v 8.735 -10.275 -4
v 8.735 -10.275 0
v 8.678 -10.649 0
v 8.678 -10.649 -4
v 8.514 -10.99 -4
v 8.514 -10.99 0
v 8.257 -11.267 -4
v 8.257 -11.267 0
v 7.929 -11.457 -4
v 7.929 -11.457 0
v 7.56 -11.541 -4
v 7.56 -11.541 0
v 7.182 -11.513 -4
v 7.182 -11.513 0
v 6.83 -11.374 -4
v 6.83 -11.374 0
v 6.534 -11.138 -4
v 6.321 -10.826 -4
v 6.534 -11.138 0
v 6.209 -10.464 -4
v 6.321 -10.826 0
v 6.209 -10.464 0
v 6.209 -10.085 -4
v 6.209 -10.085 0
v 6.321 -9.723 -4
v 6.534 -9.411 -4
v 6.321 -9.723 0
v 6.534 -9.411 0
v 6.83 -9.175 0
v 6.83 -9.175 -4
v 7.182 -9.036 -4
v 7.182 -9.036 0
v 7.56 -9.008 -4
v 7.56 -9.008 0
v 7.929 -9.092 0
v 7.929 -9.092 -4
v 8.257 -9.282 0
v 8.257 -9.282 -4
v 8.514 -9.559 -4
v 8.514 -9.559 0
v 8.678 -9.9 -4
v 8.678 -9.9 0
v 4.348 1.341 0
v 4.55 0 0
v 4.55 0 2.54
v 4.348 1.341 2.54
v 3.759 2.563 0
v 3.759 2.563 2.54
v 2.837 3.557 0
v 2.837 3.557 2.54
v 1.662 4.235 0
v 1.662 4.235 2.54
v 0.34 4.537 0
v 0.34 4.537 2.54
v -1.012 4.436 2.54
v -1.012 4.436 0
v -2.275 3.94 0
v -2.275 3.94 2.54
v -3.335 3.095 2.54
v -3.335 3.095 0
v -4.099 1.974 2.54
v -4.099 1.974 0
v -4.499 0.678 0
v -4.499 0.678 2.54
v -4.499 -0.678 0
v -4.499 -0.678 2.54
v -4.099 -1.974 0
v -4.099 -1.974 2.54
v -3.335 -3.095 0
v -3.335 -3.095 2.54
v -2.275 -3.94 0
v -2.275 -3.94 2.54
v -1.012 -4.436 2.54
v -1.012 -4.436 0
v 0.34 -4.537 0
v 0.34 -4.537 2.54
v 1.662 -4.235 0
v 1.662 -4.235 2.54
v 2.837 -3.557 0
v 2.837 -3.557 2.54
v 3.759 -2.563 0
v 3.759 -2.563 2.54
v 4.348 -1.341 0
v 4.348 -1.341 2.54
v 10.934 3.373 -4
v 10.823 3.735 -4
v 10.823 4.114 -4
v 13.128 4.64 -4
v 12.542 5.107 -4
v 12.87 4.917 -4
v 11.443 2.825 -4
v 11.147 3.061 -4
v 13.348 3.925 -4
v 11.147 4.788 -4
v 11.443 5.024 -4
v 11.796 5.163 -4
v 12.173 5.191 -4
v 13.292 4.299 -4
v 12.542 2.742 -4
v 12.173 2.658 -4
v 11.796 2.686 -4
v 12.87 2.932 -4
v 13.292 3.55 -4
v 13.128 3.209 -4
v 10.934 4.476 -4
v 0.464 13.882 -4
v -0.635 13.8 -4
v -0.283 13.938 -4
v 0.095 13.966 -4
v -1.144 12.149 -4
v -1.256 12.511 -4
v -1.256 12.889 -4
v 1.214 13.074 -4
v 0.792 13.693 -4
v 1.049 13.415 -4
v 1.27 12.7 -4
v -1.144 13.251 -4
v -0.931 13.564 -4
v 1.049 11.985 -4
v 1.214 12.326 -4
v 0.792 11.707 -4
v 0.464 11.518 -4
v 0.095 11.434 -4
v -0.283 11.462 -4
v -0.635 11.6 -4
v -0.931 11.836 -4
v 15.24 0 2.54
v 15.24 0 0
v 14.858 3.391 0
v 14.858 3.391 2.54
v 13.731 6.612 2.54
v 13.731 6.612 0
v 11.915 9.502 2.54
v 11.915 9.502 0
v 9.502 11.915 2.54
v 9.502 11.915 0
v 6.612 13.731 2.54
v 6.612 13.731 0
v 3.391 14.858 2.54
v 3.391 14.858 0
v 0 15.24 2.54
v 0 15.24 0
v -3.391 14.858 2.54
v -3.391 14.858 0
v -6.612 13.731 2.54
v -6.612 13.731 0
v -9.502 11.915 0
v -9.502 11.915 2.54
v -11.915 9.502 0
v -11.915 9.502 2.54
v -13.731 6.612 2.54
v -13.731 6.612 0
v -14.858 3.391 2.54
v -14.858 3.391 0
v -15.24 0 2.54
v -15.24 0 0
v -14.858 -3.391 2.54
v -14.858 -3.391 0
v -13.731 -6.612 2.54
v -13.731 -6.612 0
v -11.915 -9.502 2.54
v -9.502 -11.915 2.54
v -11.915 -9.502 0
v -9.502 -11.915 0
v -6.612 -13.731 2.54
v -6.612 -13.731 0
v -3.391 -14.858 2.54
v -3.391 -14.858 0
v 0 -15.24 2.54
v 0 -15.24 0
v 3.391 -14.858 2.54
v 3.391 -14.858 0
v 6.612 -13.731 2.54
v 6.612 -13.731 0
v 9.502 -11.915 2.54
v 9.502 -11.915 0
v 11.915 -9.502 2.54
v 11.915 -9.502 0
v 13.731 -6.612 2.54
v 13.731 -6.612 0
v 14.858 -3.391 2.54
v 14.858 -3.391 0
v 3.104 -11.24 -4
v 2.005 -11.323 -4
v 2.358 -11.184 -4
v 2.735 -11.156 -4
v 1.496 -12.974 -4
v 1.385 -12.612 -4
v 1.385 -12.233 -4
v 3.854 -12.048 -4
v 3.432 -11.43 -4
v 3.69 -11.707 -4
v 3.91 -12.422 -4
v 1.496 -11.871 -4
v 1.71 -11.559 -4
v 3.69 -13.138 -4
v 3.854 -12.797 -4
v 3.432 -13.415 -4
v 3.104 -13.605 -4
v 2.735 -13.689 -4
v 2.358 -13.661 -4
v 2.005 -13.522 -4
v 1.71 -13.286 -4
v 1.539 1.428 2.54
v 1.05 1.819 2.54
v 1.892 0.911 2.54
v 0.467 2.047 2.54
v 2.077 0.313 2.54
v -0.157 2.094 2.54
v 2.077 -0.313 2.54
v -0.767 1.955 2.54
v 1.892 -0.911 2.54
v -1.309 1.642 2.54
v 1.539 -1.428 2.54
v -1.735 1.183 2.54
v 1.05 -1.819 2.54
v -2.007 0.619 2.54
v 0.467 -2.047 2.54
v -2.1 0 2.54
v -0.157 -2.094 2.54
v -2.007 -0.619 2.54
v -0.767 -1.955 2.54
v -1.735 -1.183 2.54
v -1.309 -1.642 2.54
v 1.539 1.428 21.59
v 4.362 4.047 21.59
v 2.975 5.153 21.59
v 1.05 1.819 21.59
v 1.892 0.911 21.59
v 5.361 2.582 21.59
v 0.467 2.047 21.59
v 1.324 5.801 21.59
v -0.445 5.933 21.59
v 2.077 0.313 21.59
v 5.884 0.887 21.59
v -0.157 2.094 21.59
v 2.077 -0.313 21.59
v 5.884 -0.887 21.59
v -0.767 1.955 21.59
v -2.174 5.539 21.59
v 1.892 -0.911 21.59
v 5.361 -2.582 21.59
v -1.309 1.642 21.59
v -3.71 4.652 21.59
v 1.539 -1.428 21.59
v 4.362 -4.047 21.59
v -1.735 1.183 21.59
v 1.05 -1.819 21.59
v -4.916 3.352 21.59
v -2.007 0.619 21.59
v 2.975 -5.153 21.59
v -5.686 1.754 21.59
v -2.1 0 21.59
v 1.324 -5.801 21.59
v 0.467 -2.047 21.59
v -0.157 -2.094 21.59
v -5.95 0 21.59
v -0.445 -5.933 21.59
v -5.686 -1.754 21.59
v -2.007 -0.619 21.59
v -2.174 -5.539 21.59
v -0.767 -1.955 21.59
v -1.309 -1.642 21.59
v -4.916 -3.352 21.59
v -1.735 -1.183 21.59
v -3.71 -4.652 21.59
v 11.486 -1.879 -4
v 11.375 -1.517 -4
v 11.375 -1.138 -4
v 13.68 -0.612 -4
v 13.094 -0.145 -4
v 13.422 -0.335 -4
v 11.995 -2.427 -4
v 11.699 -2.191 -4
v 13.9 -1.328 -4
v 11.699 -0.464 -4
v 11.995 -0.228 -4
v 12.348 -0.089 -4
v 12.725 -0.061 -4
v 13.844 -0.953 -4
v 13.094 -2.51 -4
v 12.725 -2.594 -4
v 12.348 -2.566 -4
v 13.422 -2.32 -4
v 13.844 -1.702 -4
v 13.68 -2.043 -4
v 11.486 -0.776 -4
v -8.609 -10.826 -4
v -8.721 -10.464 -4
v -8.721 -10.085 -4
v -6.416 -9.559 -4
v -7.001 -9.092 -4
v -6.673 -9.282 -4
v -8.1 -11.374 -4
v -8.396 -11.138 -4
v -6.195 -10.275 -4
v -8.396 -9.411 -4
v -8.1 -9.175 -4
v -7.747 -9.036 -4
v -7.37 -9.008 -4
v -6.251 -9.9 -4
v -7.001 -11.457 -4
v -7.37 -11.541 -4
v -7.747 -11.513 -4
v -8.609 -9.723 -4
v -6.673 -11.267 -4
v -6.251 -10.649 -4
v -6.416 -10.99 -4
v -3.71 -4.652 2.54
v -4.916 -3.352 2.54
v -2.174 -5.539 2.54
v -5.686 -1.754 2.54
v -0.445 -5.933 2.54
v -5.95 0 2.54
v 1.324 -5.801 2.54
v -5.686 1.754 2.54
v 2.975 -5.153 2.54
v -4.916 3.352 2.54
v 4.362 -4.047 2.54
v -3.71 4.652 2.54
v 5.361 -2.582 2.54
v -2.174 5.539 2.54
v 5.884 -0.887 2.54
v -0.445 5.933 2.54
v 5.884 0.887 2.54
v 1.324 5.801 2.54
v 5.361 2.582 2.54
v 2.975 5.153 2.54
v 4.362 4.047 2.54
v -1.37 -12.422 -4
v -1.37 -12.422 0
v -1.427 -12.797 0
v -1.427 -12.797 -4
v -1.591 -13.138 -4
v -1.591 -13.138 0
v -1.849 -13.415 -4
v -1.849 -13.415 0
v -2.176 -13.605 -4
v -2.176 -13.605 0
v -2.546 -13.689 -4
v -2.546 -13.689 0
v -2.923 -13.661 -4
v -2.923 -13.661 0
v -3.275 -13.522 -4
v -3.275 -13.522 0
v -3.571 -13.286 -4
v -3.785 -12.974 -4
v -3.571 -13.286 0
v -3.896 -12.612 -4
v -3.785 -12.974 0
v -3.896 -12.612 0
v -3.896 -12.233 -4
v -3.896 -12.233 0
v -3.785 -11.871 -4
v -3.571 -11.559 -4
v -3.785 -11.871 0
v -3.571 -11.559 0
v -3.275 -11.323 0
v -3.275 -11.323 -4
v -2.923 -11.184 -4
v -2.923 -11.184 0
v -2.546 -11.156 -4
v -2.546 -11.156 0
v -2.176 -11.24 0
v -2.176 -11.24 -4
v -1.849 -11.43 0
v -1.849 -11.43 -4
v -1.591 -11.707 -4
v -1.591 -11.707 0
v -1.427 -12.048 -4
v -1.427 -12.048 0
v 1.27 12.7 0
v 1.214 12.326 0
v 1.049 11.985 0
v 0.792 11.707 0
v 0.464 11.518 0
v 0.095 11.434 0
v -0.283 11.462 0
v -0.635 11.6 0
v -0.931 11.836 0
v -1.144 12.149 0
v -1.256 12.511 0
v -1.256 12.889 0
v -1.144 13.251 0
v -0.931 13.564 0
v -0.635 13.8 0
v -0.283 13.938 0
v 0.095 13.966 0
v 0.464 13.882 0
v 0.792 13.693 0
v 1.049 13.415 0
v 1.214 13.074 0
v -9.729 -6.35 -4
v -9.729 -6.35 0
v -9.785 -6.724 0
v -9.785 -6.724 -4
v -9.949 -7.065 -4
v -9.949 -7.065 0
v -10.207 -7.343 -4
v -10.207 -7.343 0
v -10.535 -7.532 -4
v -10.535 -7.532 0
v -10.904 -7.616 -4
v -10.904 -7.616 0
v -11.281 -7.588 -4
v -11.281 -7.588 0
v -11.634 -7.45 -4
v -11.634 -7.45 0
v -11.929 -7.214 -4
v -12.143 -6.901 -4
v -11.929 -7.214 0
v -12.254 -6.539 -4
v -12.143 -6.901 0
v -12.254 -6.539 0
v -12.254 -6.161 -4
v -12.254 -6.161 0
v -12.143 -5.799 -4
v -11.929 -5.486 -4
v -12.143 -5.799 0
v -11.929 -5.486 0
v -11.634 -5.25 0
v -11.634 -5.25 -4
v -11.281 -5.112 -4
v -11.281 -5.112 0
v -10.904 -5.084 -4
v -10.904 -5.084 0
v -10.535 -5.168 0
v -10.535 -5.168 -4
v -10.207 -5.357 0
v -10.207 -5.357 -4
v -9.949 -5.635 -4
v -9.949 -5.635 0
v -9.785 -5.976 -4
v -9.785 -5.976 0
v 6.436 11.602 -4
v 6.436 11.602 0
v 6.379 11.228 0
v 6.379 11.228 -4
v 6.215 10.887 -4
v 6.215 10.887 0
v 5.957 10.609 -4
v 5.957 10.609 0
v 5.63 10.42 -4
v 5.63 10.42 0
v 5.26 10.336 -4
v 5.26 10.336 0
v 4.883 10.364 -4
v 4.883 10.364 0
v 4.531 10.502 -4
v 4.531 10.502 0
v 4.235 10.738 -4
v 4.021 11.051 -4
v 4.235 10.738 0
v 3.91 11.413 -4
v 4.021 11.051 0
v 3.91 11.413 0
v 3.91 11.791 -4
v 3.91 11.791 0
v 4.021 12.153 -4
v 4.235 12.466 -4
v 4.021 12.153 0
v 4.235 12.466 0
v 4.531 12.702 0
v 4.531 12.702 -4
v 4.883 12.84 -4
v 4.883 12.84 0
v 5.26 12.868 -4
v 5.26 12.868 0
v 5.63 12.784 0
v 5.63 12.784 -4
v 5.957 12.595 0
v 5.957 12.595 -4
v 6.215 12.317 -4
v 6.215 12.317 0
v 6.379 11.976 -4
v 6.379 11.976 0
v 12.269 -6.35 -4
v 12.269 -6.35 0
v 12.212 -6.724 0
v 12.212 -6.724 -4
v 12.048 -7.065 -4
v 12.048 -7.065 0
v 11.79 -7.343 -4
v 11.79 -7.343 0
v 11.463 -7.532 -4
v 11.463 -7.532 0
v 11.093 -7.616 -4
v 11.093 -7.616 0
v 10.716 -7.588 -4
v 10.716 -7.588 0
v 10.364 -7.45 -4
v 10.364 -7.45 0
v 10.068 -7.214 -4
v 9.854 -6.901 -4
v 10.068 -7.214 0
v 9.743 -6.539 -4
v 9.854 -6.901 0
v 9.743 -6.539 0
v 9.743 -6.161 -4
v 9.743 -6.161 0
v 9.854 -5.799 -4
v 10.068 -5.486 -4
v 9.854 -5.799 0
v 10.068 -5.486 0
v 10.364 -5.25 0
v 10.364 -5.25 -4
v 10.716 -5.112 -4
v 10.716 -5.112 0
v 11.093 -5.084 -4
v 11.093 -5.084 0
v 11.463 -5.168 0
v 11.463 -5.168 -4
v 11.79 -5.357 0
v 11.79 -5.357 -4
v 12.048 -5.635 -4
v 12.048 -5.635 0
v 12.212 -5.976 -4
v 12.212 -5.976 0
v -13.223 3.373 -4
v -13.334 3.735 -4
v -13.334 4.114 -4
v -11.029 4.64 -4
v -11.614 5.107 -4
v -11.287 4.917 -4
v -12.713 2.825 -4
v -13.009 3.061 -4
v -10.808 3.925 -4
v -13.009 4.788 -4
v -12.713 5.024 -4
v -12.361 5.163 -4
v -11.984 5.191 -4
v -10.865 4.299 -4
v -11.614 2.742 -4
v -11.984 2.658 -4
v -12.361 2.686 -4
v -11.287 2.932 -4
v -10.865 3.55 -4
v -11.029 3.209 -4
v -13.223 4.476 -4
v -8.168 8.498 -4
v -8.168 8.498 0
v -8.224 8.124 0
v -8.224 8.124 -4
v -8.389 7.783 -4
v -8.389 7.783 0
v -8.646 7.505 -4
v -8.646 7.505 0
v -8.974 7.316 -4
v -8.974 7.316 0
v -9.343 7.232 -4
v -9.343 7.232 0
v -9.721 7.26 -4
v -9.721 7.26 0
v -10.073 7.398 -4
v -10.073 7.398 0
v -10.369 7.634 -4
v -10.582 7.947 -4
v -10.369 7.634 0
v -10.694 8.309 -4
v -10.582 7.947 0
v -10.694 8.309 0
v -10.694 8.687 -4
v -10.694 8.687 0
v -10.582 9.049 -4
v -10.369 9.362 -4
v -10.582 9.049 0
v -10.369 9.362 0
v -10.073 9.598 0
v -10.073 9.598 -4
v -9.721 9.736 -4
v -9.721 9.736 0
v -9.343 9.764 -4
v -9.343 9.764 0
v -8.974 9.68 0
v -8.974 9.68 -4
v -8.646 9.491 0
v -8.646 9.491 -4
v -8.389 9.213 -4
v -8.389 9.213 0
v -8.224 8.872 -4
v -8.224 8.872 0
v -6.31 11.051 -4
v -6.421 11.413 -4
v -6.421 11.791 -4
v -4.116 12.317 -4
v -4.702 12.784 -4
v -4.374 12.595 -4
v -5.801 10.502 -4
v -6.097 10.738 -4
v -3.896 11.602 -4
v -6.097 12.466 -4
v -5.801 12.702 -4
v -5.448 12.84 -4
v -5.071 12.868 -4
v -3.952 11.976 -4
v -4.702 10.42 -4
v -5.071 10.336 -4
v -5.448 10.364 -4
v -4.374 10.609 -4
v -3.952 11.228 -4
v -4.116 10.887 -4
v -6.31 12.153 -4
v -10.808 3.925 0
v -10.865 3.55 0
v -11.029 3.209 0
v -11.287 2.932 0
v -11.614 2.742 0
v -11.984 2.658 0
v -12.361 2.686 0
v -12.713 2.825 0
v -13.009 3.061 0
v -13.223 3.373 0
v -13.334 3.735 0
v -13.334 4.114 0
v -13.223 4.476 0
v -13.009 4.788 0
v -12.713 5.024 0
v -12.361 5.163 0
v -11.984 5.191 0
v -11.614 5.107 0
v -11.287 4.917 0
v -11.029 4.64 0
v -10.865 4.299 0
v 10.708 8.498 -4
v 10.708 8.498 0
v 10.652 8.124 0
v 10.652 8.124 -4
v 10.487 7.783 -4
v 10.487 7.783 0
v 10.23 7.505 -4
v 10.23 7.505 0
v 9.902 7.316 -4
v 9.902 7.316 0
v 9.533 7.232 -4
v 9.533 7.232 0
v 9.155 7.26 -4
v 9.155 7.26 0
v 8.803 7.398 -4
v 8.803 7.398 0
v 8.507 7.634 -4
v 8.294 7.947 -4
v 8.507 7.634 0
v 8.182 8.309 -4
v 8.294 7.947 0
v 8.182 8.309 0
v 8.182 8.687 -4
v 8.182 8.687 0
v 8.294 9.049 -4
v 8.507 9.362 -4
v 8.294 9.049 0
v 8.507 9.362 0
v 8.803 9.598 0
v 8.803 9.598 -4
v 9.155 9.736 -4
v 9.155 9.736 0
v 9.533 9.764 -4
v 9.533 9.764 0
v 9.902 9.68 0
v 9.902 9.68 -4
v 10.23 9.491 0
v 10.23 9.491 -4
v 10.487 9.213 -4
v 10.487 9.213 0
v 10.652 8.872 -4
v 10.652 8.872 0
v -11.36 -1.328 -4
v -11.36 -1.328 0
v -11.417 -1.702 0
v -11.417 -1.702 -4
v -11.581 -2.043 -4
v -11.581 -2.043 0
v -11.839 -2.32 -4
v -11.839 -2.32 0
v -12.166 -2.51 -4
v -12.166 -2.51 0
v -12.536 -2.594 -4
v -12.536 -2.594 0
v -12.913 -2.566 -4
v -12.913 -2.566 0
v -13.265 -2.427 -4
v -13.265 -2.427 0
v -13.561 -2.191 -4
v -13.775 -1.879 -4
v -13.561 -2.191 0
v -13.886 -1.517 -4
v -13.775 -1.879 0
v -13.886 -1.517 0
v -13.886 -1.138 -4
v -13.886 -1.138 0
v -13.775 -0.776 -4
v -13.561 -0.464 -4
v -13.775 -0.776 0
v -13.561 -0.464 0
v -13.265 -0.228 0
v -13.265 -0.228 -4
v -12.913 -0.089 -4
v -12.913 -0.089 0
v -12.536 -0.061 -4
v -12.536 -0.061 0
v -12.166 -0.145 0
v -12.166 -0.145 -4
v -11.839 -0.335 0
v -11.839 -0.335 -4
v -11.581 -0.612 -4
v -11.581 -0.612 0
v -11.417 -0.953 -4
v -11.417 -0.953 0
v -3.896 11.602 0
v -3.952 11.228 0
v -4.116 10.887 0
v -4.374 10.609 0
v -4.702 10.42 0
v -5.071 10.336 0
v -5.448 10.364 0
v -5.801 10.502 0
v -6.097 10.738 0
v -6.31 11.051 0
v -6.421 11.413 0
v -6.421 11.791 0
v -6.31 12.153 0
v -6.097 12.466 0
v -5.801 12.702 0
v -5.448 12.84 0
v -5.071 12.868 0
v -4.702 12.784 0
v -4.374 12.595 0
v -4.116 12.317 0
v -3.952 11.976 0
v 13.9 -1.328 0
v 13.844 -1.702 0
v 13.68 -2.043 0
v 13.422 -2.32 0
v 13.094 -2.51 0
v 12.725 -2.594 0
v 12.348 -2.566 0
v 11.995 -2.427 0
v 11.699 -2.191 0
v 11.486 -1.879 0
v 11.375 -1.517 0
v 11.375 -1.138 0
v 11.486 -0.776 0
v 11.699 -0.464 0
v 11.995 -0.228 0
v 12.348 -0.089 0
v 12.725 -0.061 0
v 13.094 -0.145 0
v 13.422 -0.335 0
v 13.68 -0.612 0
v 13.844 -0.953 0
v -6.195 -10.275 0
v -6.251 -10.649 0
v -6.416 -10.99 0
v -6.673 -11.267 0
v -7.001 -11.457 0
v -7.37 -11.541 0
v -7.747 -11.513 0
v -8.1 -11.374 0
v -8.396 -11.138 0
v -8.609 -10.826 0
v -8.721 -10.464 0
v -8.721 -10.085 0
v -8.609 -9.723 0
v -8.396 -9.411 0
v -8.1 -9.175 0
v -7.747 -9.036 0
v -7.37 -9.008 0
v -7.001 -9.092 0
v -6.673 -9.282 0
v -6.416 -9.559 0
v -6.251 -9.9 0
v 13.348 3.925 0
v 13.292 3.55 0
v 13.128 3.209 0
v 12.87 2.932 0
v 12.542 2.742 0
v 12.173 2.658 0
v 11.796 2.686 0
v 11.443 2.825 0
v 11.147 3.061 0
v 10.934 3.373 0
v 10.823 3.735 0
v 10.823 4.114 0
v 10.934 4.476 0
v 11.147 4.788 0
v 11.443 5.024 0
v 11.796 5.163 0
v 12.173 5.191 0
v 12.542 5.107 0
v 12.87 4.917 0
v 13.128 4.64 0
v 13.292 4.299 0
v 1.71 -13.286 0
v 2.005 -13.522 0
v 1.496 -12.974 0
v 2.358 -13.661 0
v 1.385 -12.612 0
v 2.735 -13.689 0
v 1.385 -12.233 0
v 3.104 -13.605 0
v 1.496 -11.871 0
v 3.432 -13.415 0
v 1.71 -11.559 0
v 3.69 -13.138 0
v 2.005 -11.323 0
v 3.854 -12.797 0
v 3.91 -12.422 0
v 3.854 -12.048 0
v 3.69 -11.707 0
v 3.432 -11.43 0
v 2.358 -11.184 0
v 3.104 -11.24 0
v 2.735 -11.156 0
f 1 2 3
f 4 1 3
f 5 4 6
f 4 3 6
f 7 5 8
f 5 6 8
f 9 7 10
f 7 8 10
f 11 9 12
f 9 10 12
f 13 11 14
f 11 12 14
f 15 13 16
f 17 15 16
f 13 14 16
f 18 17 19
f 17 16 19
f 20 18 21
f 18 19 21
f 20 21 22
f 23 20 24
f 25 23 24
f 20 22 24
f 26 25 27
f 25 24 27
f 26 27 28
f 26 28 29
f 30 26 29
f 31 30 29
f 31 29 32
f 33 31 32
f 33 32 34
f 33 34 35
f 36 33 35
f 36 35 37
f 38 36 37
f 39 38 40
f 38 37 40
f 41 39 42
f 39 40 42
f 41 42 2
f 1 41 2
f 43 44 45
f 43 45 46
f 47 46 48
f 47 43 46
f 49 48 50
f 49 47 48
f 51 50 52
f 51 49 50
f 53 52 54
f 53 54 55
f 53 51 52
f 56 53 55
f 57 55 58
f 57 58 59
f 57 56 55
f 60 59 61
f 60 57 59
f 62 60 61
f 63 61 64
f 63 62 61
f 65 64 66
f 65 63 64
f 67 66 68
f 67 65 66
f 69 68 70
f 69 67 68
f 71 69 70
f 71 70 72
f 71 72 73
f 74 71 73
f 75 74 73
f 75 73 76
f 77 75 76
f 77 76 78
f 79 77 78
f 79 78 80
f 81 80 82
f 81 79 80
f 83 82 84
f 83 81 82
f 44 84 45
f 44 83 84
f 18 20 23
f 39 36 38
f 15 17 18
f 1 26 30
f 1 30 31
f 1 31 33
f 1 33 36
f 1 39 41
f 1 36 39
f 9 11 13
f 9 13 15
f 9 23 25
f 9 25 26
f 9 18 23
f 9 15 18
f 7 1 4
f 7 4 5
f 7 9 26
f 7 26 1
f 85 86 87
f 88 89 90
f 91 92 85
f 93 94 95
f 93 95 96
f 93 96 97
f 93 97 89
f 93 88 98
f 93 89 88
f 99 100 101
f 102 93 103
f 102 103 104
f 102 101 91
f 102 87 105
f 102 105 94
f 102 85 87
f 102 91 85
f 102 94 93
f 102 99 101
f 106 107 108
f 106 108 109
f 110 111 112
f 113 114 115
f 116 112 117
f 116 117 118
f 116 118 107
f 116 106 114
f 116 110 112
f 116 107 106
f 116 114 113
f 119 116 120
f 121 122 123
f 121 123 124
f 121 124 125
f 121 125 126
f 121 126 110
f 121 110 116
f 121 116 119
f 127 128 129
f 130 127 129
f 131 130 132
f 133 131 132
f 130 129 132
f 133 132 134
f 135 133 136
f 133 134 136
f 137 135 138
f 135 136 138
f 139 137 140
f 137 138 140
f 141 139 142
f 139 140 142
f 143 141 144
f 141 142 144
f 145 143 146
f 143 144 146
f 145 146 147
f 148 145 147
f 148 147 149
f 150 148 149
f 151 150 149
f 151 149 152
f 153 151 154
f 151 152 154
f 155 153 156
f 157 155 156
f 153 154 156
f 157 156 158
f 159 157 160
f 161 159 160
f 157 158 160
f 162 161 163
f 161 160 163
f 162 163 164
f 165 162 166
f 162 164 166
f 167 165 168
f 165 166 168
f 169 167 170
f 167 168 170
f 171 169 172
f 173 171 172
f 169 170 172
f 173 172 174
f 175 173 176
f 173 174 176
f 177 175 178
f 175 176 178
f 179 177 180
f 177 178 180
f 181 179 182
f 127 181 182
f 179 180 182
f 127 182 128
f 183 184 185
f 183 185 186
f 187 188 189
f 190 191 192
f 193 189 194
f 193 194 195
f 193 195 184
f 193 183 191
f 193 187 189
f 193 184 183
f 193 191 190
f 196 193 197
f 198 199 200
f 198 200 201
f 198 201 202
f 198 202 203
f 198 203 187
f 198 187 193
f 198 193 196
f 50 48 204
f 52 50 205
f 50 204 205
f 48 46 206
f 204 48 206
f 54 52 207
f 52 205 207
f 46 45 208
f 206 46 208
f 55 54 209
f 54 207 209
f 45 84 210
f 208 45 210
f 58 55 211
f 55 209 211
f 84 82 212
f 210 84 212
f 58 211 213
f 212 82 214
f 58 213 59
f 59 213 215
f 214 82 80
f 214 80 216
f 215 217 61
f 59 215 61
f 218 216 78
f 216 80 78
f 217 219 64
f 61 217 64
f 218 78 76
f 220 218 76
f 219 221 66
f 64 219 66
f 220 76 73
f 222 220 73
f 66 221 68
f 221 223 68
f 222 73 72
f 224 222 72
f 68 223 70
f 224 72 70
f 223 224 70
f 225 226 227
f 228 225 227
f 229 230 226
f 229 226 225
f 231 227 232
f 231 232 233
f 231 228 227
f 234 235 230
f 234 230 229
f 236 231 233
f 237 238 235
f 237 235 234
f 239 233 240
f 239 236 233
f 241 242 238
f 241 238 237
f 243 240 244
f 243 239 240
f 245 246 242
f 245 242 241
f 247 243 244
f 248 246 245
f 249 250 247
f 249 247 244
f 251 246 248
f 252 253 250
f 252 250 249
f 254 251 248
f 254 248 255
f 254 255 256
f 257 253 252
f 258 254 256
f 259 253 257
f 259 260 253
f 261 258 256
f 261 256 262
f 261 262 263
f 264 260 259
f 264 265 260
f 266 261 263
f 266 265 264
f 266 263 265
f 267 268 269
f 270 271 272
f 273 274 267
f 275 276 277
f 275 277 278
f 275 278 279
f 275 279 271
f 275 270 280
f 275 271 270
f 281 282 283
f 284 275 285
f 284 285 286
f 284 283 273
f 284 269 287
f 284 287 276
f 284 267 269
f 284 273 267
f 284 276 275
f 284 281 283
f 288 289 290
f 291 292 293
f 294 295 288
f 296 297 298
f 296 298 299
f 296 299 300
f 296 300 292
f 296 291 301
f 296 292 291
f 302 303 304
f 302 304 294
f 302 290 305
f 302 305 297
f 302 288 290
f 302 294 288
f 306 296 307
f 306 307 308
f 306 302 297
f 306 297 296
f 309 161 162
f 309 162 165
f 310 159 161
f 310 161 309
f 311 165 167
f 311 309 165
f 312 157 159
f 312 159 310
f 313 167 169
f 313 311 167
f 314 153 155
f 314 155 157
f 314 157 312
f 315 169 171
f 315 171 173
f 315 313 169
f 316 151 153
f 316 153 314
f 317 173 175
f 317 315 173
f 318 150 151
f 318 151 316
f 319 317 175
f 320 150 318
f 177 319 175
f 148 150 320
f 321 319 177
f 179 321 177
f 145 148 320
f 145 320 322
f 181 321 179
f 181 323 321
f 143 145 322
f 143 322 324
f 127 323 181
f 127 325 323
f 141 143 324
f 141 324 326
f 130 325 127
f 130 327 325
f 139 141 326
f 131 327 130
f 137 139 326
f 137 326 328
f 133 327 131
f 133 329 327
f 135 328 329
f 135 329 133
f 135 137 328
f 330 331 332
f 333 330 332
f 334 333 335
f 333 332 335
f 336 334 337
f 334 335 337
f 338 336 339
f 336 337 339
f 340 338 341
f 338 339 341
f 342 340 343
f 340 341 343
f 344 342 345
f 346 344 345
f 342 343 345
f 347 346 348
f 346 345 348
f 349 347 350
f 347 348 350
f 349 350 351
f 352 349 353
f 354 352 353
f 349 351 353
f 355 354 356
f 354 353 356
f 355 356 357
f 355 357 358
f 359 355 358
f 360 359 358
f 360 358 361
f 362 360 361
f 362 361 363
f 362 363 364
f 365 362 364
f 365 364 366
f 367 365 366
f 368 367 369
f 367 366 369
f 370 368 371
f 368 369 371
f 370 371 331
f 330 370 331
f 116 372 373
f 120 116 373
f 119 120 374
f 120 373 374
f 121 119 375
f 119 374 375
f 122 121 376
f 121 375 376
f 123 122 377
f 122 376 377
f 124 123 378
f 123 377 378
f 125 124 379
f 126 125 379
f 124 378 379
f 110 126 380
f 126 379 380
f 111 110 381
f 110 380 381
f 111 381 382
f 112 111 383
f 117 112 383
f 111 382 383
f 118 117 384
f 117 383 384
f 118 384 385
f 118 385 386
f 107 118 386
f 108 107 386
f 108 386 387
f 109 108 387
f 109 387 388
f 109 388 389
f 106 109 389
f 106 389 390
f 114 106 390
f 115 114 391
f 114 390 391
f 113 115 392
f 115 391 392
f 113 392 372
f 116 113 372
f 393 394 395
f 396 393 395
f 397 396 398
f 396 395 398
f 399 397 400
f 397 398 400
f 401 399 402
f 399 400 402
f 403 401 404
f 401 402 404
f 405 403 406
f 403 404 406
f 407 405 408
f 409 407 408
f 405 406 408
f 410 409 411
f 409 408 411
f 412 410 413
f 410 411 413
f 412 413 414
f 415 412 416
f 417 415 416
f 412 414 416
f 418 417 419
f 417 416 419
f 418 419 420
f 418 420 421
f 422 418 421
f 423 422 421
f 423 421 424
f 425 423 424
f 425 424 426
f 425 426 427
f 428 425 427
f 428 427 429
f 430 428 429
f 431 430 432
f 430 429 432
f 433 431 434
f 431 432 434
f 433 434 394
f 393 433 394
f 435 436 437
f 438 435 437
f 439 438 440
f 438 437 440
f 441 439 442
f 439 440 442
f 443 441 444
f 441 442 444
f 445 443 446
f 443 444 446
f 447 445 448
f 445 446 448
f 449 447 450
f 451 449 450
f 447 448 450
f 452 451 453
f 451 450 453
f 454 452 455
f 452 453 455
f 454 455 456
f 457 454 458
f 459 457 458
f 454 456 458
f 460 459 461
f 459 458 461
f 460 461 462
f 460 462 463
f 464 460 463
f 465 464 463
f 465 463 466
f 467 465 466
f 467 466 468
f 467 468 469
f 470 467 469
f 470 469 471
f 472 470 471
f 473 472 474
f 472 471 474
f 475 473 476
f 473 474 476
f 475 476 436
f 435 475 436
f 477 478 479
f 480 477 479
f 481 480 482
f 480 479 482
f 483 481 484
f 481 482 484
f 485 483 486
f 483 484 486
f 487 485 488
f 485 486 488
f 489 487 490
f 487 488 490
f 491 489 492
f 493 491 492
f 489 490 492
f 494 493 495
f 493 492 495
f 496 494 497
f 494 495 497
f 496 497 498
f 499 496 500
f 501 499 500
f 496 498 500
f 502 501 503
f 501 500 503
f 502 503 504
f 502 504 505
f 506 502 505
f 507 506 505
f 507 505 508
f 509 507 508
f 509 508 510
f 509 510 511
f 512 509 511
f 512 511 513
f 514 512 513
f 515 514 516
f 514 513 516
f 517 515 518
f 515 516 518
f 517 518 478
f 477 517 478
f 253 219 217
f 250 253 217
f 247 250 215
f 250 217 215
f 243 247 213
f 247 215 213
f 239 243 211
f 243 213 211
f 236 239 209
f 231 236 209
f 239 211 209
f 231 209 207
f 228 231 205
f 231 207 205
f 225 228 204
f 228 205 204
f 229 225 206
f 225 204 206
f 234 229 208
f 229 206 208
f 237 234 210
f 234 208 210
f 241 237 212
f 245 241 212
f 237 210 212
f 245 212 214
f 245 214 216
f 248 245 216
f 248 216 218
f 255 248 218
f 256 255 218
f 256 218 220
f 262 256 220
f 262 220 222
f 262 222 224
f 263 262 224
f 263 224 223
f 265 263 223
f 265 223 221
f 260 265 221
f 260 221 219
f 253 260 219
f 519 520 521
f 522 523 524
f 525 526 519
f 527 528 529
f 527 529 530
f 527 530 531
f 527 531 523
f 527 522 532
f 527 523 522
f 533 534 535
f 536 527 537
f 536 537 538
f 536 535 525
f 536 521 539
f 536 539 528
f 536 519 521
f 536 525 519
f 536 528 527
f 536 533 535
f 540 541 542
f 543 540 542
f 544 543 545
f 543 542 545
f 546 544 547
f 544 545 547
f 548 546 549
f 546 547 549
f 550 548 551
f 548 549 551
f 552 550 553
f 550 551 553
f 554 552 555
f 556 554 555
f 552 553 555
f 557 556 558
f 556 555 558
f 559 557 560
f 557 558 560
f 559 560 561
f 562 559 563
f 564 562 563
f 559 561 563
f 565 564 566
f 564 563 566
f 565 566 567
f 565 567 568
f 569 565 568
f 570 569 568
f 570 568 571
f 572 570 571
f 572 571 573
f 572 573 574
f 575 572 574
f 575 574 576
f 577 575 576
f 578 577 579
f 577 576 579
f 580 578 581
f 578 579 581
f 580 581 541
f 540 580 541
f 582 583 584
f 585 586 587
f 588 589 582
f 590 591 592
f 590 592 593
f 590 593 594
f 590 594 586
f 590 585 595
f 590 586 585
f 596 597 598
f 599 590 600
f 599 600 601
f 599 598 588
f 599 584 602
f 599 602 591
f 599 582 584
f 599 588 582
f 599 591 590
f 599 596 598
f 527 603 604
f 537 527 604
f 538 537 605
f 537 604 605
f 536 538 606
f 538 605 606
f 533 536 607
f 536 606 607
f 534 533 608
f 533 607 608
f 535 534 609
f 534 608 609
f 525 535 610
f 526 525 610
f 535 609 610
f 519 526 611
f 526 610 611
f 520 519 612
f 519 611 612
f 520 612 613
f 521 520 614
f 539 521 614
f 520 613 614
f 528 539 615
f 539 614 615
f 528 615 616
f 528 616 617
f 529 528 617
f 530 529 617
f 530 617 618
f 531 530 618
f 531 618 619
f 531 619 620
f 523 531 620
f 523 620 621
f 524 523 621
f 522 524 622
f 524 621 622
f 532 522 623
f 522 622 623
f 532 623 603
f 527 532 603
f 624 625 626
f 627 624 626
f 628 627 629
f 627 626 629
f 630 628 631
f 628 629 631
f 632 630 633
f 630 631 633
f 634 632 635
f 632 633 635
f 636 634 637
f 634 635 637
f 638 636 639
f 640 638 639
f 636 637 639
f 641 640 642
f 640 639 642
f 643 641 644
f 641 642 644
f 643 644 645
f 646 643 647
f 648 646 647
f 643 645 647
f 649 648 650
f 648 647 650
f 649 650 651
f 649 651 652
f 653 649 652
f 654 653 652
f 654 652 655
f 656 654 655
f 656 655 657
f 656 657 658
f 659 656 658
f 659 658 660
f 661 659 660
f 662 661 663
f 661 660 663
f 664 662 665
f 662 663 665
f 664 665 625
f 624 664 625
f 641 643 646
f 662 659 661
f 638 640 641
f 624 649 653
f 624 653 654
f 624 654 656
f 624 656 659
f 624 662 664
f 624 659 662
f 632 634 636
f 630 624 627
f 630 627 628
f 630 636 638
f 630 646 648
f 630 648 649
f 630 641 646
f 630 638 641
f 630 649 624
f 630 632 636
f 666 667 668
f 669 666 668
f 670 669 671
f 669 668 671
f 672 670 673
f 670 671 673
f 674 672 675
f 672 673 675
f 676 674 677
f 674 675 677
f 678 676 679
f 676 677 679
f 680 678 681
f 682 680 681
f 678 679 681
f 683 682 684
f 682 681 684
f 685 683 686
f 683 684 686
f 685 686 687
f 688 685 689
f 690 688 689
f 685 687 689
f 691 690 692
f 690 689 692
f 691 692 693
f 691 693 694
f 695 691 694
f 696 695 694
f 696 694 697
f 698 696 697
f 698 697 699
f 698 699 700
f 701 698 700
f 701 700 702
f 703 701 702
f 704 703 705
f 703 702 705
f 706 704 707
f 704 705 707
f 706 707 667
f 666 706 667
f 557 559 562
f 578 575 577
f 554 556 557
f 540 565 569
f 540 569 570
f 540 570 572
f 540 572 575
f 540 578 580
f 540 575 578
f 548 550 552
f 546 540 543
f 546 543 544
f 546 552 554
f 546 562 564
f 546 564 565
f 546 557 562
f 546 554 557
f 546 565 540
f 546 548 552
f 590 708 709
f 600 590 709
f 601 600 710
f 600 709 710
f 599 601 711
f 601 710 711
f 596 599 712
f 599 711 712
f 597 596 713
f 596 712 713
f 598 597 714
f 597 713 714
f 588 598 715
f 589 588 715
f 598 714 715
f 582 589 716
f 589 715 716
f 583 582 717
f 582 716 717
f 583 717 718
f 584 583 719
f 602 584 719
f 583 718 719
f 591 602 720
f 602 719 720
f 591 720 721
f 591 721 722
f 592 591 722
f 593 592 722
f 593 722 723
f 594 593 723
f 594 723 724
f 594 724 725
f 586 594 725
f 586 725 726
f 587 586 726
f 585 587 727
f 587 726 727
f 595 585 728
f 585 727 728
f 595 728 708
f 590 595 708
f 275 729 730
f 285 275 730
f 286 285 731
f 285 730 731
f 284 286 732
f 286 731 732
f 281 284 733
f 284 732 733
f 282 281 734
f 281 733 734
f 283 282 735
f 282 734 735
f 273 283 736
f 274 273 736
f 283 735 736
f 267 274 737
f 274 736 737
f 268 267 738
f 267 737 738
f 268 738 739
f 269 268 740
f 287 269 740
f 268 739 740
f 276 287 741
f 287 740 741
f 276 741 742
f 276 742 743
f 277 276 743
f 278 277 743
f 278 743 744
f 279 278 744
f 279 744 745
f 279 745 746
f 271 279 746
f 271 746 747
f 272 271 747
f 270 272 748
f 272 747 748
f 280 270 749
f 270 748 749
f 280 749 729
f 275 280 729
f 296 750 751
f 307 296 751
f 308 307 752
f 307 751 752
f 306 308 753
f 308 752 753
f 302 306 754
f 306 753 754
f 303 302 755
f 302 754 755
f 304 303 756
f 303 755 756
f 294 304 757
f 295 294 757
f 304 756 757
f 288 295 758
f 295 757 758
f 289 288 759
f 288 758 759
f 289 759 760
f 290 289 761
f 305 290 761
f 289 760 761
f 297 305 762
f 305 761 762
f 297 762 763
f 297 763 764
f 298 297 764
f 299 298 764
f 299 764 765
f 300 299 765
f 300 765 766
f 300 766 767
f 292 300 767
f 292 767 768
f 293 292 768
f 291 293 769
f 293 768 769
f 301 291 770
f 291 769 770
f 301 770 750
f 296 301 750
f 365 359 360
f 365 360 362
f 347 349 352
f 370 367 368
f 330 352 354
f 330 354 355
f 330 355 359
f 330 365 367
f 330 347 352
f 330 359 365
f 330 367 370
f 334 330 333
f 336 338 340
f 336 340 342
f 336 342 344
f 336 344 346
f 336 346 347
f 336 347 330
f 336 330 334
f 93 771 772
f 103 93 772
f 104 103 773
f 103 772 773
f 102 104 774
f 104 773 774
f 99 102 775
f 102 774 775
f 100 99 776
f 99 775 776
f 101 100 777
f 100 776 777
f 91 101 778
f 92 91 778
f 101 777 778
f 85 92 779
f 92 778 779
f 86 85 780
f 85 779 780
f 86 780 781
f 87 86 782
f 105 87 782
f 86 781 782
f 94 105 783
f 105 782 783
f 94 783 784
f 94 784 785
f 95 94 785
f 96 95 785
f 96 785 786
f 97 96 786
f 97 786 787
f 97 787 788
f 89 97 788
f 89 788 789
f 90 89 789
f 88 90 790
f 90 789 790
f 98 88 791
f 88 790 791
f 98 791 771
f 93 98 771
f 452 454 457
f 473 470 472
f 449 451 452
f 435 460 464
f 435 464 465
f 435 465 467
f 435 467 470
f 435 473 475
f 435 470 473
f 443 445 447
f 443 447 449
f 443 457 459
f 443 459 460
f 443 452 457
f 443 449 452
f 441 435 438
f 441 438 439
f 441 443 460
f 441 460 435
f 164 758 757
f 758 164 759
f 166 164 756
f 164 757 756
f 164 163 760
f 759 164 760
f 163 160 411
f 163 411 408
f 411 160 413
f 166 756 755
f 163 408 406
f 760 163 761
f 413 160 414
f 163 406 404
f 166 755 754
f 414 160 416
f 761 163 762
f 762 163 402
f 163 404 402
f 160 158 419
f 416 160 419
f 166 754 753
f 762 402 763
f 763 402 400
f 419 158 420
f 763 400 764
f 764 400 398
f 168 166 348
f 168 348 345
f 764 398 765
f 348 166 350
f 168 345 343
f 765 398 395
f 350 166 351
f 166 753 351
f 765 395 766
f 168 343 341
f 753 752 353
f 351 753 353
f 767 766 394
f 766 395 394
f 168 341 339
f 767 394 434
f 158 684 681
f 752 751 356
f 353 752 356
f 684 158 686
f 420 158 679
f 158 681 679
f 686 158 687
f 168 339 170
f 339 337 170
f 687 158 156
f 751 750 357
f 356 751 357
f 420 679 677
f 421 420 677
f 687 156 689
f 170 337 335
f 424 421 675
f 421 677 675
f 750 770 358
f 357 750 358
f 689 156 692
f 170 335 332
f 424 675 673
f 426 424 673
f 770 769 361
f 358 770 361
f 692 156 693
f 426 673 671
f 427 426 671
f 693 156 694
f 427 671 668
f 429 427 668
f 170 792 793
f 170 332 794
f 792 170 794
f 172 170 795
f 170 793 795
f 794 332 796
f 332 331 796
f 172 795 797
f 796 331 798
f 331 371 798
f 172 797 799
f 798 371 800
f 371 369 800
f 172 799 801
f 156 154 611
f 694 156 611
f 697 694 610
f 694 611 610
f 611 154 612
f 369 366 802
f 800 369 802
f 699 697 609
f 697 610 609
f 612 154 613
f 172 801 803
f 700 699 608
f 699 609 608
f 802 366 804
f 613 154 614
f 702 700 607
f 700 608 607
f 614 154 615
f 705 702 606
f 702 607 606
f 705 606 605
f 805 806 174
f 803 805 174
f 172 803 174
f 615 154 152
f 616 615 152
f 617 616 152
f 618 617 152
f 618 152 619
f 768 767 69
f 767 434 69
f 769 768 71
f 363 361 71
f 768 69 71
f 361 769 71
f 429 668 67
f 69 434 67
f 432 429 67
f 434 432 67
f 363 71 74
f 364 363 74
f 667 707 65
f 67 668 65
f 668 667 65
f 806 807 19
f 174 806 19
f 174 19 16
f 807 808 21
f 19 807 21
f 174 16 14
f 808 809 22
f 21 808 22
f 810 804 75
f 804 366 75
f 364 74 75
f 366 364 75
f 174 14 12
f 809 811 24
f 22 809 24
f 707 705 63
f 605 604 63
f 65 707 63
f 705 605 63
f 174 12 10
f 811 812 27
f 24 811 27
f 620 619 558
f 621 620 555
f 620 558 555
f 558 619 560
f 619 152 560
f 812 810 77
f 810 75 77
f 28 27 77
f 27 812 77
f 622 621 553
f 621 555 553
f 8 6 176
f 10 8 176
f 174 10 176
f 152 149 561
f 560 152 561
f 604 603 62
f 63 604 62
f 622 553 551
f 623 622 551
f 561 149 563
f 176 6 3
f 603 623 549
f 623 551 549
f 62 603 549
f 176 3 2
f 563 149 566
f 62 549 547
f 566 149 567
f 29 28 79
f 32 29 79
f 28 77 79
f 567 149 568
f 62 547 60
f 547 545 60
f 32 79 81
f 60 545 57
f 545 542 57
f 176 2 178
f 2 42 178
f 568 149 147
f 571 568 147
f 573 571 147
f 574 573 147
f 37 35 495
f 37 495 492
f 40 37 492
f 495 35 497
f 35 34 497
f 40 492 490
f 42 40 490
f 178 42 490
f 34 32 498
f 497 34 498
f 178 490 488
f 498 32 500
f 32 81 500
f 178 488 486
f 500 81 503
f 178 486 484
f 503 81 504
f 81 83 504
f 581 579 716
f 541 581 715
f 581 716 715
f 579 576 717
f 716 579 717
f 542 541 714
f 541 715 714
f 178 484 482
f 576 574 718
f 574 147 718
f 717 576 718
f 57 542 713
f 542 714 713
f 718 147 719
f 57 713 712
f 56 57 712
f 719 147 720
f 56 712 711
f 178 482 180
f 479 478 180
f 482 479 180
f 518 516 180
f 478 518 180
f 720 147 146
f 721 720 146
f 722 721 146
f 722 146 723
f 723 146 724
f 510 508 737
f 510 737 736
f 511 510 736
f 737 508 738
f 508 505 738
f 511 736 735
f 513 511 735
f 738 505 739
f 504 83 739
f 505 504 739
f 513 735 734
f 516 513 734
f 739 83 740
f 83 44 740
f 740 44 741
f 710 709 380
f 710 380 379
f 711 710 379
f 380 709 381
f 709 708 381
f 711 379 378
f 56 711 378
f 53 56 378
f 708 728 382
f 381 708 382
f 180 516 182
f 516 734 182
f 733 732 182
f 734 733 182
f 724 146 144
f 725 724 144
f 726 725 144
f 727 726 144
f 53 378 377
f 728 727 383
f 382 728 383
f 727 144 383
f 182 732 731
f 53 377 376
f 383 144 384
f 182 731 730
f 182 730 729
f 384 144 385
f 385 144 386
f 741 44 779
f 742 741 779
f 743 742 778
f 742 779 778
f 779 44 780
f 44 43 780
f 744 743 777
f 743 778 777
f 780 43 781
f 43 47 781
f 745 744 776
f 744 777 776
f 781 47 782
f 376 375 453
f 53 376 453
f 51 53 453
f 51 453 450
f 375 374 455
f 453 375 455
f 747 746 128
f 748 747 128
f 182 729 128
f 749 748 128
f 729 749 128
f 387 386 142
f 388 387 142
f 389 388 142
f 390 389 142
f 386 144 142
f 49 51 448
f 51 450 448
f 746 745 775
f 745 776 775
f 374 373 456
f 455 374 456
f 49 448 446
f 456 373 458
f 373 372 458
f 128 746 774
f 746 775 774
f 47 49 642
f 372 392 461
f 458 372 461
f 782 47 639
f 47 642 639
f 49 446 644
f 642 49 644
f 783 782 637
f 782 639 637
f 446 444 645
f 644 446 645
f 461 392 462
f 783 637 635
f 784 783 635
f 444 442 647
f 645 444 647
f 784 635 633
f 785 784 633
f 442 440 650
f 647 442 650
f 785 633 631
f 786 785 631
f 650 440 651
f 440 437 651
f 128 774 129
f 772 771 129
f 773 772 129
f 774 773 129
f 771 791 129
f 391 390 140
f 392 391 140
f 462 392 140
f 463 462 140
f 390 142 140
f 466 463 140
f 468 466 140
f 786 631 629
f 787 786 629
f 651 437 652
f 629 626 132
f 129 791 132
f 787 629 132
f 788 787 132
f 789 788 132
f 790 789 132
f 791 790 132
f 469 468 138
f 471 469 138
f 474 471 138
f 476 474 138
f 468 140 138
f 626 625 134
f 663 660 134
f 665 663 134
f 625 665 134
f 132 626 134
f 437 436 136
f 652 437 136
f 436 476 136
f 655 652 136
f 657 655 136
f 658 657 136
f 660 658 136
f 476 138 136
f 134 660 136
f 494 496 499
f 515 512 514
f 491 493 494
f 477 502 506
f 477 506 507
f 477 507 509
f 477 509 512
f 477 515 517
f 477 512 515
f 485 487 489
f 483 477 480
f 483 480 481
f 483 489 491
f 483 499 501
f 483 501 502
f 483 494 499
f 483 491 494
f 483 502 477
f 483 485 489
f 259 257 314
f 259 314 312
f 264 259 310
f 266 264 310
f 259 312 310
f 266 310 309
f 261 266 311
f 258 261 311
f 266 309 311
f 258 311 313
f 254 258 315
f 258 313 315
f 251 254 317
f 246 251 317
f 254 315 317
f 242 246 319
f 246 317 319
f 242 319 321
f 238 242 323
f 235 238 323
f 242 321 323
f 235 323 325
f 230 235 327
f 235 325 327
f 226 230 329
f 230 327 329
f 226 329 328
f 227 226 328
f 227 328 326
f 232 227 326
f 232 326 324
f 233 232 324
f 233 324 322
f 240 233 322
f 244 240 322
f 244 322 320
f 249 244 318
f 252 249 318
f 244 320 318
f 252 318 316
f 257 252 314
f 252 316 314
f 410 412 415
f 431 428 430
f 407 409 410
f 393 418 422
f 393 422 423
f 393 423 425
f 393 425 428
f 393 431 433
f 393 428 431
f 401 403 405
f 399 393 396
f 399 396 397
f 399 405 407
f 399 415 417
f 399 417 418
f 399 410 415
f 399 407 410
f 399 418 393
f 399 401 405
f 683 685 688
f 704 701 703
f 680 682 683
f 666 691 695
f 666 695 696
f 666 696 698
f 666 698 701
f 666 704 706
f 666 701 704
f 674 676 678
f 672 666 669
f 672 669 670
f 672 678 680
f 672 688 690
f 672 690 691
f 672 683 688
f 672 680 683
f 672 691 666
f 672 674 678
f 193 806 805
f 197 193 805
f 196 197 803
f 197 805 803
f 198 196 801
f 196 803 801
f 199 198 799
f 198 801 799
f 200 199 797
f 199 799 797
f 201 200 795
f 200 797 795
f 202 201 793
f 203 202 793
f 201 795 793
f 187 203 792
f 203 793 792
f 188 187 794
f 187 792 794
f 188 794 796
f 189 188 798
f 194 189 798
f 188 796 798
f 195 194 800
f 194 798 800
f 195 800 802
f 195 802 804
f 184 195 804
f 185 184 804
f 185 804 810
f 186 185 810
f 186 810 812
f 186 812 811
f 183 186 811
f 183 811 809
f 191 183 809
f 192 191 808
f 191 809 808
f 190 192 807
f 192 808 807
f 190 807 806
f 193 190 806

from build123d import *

# Parameters (mm, degrees)
SKETCH1_R             = 15.24
SKETCH1_R_2           = 4.55
BOSS_EXTRUDE1_DEPTH   = 2.54
SKETCH2_R             = 5.95
BOSS_EXTRUDE2_DEPTH   = 19.05
SKETCH5_R             = 1.27
BOSS_EXTRUDE5_DEPTH   = 4.000000128
M5X0_8_TAPPED_HOLE2_D = 4.2


with BuildPart() as part:
    # Sketch1 → Boss-Extrude1 (new body)
    with BuildSketch(Plane.XY):
        Circle(SKETCH1_R)
        Circle(SKETCH1_R_2, mode=Mode.SUBTRACT)
    extrude(amount=BOSS_EXTRUDE1_DEPTH)

    # Sketch2 → Boss-Extrude2 (add)
    with BuildSketch(Plane.XY.offset(2.54)):
        with Locations(Location((0, 0, 0), (0, 0, 180))):
            Circle(SKETCH2_R)
    extrude(amount=BOSS_EXTRUDE2_DEPTH)

    # Sketch5 → Boss-Extrude5 (add)
    with BuildSketch(Plane(origin=(0, 0, 0), x_dir=(-1, 0, 0), z_dir=(0, 0, -1))):
        with Locations(Location((0, 12.7, 0), (0, 0, 180))):
            Circle(SKETCH5_R)
        with Locations(Location((5.165555367, 11.602027312, 0), (0, 0, 180))):
            Circle(SKETCH5_R)
        with Locations(Location((9.437939284, 8.497958701, 0), (0, 0, 180))):
            Circle(SKETCH5_R)
        with Locations(Location((12.078417757, 3.924515829, 0), (0, 0, 180))):
            Circle(SKETCH5_R)
        with Locations(Location((12.630428071, -1.327511483, 0), (0, 0, 180))):
            Circle(SKETCH5_R)
        with Locations(Location((10.998522628, -6.35, 0), (0, 0, 180))):
            Circle(SKETCH5_R)
        with Locations(Location((7.464872704, -10.274515829, 0), (0, 0, 180))):
            Circle(SKETCH5_R)
        with Locations(Location((2.640478473, -12.422474529, 0), (0, 0, 180))):
            Circle(SKETCH5_R)
        with Locations(Location((-2.640478473, -12.422474529, 0), (0, 0, 180))):
            Circle(SKETCH5_R)
        with Locations(Location((-7.464872704, -10.274515829, 0), (0, 0, 180))):
            Circle(SKETCH5_R)
        with Locations(Location((-10.998522628, -6.35, 0), (0, 0, 180))):
            Circle(SKETCH5_R)
        with Locations(Location((-12.630428071, -1.327511483, 0), (0, 0, 180))):
            Circle(SKETCH5_R)
        with Locations(Location((-12.078417757, 3.924515829, 0), (0, 0, 180))):
            Circle(SKETCH5_R)
        with Locations(Location((-9.437939284, 8.497958701, 0), (0, 0, 180))):
            Circle(SKETCH5_R)
        with Locations(Location((-5.165555367, 11.602027312, 0), (0, 0, 180))):
            Circle(SKETCH5_R)
    extrude(amount=BOSS_EXTRUDE5_DEPTH)

    # M5x0.8 Tapped Hole2 (through all)
    with Locations(Plane.XY.offset(21.59)):
        with Locations((0, 0)):
            Hole(M5X0_8_TAPPED_HOLE2_D / 2)


solid = part.part
